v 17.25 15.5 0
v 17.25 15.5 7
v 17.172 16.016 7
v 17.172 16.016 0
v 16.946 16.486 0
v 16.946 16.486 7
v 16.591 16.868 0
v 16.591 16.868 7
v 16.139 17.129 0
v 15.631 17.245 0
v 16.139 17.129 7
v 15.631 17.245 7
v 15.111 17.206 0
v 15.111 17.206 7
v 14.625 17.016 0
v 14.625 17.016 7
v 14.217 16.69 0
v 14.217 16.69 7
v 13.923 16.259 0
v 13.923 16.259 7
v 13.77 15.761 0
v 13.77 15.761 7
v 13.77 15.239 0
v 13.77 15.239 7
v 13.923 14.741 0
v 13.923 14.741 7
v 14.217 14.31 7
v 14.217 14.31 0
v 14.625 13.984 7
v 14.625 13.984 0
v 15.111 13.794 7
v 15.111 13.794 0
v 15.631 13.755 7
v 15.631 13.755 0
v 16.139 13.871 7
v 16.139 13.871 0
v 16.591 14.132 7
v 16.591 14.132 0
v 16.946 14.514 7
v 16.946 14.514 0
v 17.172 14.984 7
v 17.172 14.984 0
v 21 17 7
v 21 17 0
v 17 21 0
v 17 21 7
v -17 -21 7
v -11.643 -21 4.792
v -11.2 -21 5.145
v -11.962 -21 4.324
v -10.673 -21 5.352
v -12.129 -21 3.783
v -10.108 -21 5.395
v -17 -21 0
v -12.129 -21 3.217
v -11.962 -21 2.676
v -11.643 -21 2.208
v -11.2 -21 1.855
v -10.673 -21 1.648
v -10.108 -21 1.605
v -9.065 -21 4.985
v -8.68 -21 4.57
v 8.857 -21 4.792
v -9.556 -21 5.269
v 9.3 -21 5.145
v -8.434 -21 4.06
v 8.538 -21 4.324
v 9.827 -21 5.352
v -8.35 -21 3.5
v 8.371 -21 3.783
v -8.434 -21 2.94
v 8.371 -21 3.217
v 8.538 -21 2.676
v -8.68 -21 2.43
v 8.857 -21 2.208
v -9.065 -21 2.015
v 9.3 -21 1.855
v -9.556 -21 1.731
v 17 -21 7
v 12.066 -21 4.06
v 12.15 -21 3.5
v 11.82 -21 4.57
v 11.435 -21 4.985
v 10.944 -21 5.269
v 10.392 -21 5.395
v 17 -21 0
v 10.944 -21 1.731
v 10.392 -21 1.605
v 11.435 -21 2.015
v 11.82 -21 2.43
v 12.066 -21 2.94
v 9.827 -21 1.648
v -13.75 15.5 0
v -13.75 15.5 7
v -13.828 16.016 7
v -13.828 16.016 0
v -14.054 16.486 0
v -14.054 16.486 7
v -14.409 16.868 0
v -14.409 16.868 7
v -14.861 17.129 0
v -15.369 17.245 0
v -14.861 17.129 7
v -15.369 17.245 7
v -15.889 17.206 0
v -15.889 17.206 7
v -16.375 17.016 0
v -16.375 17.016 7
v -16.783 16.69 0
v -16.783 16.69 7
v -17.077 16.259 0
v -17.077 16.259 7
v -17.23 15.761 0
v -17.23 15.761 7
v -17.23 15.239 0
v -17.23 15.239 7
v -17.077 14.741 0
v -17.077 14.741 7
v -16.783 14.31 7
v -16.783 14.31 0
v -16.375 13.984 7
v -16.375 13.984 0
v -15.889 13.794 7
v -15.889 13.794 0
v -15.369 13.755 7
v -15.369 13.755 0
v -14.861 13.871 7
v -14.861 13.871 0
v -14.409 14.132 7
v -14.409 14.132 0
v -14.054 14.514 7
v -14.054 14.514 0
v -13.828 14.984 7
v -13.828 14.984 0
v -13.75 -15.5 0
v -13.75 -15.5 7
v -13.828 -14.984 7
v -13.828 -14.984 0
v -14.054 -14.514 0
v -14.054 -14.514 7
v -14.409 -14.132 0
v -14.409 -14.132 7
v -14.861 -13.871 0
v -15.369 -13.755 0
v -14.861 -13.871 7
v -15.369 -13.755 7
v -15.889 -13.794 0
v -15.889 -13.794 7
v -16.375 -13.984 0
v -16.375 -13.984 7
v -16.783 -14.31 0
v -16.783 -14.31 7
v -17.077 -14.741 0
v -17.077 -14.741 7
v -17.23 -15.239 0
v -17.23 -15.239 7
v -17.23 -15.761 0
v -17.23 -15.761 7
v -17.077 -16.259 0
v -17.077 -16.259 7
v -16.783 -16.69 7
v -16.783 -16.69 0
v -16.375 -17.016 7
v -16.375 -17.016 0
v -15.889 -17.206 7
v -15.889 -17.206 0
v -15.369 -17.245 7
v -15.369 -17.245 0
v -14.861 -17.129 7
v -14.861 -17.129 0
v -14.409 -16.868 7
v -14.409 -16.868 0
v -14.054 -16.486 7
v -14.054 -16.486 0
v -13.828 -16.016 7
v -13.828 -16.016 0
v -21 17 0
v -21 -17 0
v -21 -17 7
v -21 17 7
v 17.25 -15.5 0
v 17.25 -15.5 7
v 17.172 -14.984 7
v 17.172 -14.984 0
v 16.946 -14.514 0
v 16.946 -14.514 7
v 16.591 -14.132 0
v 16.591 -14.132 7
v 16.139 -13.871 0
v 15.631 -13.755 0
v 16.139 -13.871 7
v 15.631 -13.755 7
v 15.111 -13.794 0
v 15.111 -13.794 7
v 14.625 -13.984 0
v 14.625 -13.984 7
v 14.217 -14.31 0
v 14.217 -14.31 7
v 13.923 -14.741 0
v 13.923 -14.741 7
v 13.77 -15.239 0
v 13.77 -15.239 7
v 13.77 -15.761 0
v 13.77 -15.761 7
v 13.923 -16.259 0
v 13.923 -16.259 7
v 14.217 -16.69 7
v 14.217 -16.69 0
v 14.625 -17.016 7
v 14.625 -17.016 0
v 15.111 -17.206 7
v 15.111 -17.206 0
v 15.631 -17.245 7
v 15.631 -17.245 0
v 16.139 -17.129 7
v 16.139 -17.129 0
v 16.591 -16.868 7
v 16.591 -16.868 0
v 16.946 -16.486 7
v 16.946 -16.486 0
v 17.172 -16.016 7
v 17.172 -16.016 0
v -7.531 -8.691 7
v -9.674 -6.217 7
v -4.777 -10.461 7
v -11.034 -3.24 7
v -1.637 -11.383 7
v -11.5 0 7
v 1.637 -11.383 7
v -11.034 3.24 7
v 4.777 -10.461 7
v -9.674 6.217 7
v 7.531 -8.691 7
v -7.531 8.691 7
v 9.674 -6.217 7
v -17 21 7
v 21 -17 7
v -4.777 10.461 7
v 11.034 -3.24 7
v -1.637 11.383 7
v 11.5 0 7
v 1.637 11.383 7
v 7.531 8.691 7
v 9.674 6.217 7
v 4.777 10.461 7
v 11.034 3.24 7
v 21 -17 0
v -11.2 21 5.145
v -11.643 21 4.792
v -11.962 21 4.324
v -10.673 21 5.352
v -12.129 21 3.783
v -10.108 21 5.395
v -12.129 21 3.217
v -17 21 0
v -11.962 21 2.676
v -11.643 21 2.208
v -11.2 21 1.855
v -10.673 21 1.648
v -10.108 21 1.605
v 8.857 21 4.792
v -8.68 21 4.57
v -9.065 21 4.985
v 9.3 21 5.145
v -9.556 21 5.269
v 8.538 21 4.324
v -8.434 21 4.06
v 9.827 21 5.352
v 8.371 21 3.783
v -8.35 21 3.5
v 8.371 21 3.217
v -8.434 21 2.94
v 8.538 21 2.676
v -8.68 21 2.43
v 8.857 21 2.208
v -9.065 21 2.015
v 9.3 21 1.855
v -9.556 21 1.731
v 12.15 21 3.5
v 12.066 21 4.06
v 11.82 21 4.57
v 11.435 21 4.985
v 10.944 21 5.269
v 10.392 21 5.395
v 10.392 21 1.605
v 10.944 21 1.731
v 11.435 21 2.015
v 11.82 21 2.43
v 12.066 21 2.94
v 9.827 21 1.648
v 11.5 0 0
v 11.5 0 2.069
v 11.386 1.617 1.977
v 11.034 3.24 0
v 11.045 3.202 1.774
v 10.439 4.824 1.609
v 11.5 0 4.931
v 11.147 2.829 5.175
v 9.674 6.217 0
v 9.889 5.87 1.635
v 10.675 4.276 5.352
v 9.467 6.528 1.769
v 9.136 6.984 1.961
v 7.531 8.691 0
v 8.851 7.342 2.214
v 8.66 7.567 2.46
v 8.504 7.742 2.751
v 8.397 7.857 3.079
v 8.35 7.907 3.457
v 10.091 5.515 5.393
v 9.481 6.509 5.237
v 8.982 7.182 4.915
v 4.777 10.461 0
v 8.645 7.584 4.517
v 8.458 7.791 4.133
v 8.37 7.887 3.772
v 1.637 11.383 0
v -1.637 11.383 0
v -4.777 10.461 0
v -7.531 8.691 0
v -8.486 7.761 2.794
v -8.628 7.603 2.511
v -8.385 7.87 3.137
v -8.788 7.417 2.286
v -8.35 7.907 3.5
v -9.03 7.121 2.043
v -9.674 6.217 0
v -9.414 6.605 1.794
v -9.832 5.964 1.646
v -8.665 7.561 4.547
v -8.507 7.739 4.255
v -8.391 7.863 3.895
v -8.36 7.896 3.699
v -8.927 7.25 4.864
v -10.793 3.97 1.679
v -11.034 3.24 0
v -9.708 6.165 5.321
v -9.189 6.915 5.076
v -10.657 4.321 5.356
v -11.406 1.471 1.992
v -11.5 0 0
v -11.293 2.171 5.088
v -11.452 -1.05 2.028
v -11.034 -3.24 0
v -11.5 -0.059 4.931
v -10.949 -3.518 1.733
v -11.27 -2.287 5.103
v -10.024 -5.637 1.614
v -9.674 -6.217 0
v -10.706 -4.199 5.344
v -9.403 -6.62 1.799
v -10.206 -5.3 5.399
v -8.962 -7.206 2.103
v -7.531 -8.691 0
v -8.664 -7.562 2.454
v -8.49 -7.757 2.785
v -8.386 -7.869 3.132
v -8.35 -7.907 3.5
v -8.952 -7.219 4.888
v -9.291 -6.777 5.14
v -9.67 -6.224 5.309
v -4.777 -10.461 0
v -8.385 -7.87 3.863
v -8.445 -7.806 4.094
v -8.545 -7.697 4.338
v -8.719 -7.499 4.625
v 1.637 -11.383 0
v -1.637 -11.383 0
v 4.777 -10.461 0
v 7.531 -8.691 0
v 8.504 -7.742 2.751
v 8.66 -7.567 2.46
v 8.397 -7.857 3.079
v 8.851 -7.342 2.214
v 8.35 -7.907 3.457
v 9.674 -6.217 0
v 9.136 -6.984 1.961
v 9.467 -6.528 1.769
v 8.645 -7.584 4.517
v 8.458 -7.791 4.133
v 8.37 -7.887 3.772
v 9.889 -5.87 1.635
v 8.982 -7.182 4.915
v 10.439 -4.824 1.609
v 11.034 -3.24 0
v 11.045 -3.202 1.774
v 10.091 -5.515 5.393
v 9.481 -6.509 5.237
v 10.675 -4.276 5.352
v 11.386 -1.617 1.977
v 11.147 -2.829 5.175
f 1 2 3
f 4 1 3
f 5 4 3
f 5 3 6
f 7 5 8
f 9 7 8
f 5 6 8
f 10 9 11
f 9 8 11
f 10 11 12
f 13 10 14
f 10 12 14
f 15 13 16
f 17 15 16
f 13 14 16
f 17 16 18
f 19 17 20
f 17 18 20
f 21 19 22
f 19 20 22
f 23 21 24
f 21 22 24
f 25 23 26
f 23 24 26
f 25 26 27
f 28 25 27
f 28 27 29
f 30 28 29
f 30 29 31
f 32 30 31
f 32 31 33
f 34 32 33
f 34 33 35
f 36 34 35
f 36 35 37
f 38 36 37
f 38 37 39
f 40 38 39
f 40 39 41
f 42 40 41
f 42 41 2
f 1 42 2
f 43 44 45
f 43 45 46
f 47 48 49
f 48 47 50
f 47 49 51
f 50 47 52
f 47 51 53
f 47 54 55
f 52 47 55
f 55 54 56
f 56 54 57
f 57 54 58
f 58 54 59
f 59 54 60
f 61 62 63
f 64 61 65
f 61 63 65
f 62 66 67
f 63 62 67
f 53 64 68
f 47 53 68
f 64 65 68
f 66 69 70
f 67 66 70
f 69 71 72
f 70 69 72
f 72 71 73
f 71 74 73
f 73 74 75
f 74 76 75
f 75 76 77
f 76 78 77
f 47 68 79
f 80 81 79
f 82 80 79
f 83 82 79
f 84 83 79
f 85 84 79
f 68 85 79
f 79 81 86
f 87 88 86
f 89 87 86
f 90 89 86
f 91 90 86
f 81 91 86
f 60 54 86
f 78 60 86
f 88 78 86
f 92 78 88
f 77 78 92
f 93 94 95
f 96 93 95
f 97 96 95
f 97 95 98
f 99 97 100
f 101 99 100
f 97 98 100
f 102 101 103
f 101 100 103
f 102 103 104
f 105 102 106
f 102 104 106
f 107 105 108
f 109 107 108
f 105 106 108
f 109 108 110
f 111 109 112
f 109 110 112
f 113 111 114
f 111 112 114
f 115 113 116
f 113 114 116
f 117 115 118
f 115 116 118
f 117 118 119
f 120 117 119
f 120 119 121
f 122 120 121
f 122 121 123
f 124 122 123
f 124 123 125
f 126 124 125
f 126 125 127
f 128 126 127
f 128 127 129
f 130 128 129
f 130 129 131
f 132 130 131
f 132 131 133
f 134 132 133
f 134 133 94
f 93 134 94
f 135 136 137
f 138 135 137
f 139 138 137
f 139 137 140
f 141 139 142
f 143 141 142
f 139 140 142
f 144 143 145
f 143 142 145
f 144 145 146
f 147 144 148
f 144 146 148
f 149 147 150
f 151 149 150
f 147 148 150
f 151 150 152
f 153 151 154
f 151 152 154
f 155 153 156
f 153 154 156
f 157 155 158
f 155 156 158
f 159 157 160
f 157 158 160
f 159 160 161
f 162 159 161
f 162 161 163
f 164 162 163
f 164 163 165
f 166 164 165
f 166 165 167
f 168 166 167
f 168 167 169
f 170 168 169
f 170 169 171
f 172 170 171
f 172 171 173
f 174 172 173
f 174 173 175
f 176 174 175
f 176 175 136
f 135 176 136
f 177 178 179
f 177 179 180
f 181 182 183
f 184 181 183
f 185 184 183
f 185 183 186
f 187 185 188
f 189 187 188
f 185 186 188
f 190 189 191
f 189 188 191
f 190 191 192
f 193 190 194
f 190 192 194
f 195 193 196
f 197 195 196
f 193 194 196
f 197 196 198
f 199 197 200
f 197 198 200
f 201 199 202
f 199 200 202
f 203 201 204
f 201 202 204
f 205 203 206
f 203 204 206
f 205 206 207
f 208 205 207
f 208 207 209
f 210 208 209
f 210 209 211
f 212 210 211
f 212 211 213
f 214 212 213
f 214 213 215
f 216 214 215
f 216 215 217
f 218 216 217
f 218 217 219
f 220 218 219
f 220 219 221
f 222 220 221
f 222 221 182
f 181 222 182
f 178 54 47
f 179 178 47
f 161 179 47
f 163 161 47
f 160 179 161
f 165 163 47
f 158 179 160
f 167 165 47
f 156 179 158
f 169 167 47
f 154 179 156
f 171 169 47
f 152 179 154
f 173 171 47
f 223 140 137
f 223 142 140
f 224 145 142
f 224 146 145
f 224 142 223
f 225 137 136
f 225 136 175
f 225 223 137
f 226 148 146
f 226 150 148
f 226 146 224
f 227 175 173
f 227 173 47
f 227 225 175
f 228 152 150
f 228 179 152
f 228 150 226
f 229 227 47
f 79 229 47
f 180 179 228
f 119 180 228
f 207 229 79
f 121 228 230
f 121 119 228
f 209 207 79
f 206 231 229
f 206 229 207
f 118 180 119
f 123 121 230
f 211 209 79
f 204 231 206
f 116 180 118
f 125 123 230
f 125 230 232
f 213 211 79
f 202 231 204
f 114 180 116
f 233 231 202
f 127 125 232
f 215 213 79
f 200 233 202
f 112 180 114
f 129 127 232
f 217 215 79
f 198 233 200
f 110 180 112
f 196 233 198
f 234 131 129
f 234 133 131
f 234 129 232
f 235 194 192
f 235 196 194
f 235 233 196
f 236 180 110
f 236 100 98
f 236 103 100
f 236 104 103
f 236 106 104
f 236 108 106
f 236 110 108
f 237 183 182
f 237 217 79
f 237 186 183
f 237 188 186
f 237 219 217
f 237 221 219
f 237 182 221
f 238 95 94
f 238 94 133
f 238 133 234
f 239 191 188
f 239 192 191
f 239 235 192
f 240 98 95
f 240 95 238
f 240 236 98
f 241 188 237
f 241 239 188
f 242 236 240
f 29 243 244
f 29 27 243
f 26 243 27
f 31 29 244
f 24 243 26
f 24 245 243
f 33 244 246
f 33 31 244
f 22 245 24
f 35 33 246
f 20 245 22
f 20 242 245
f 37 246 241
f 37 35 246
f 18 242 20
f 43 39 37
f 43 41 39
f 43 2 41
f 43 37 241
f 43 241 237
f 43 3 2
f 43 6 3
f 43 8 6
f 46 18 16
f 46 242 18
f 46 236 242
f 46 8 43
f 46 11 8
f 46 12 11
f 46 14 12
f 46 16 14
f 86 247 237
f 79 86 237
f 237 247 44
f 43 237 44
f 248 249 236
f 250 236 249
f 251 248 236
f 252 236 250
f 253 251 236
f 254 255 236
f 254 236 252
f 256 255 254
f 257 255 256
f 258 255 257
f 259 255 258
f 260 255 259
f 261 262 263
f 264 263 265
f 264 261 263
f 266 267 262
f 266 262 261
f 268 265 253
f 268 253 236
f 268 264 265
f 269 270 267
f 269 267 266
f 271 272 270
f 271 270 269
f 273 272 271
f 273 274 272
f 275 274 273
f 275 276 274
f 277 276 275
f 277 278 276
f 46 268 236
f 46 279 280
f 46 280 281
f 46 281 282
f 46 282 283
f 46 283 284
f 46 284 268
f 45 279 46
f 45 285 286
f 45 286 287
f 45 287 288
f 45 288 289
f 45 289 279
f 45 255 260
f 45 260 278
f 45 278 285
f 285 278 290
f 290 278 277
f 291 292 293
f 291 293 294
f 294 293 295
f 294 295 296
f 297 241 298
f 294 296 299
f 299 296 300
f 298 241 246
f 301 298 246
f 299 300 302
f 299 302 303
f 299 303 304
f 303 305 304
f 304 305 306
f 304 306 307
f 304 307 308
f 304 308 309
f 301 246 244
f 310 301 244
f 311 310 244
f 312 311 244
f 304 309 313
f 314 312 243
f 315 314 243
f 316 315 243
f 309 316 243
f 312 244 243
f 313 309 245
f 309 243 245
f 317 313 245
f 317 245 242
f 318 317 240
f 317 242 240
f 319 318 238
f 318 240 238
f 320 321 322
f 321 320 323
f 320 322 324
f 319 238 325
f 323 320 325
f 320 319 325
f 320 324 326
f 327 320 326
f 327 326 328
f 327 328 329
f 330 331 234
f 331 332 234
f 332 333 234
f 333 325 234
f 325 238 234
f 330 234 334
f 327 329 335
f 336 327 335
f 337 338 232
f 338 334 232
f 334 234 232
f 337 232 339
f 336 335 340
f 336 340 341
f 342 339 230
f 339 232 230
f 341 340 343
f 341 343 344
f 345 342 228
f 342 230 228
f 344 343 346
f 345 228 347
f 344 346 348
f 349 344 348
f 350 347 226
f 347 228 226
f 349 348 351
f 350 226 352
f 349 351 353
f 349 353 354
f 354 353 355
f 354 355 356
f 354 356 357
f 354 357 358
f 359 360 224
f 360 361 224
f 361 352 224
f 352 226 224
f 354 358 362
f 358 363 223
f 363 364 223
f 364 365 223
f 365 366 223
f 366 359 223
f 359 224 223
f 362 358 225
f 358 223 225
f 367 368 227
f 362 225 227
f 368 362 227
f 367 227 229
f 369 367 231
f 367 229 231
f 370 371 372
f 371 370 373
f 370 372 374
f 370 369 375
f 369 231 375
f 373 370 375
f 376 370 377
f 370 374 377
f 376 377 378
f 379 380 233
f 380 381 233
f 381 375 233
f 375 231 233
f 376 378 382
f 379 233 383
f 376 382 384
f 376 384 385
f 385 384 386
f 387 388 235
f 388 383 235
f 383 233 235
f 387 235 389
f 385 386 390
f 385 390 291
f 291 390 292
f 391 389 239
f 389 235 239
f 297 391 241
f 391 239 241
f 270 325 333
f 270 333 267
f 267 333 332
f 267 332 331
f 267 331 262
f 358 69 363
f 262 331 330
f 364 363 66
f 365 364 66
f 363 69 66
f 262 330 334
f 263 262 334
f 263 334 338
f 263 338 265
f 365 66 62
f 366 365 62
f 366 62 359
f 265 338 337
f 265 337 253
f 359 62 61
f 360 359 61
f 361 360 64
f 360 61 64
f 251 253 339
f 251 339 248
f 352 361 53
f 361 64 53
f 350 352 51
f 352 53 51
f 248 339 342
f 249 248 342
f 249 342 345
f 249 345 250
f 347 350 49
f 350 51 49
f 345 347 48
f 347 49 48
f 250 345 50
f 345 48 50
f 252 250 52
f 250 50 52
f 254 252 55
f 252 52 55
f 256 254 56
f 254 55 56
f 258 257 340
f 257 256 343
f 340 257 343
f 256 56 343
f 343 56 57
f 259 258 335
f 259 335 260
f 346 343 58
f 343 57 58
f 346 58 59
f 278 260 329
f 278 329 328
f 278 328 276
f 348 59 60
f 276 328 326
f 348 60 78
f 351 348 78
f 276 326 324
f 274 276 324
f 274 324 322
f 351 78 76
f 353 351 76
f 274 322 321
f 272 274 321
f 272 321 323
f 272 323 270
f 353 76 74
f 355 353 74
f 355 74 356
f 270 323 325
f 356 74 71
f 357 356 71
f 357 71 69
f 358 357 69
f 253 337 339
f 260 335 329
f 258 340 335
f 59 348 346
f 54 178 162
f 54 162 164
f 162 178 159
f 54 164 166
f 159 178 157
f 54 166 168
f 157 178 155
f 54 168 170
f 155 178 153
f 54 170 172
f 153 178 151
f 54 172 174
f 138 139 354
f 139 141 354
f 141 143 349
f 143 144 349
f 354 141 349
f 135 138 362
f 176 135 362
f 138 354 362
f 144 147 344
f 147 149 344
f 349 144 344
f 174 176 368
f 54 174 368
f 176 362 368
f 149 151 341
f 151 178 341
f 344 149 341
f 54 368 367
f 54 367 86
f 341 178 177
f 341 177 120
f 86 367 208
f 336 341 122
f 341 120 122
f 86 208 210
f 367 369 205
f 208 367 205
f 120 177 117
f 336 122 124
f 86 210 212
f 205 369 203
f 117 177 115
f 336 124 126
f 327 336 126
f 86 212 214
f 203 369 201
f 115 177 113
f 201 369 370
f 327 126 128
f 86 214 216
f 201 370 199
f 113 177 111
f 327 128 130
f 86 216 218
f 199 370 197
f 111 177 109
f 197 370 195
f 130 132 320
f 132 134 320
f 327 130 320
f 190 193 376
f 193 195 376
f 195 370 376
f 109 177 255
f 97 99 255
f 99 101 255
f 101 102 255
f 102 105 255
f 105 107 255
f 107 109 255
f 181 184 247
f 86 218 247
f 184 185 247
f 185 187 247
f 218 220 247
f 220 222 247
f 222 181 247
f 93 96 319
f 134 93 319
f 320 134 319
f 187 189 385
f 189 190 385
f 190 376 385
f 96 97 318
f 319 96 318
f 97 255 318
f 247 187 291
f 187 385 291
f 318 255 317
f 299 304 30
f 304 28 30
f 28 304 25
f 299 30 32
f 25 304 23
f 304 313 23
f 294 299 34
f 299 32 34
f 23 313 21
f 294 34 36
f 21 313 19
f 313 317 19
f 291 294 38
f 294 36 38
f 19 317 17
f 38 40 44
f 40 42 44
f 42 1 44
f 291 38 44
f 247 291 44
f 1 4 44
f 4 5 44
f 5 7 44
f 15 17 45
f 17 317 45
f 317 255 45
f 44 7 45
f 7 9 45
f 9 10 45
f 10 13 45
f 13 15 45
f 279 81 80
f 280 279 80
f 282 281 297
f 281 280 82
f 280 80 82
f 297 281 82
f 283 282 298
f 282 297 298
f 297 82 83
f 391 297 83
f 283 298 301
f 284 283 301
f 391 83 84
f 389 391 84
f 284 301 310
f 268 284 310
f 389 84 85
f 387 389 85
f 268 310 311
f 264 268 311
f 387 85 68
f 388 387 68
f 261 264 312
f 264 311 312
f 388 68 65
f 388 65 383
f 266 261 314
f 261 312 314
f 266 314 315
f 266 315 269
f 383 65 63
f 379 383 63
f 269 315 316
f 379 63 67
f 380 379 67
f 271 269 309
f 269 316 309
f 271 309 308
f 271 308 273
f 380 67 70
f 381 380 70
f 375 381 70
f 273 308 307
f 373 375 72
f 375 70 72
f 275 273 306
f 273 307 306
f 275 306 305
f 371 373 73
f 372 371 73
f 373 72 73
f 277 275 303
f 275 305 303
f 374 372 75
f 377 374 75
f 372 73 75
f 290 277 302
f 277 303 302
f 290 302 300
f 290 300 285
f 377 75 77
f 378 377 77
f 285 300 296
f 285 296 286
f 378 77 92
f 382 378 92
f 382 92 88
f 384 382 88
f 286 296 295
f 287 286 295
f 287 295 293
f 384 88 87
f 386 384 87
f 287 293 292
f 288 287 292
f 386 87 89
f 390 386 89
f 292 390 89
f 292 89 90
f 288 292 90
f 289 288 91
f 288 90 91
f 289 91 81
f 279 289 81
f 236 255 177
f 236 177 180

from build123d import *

# Parameters (mm, degrees)
SKETCH_W        = 42
SKETCH_H        = 42
PAD_DEPTH       = 7
SKETCH001_R     = 11.5
POCKET_DEPTH    = 12
SKETCH002_R     = 1.75
POCKET001_DEPTH = 12
SKETCH003_R     = 1.9
POCKET002_DEPTH = 42
CHAMFER_SIZE    = 4


with BuildPart() as part:
    # Sketch → Pad (new body)
    with BuildSketch(Plane.XY):
        Rectangle(SKETCH_W, SKETCH_H)
    extrude(amount=PAD_DEPTH)

    # Sketch001 (on Face6 of Pad) → Pocket (cut)
    with BuildSketch(Plane.XY.offset(7)):
        Circle(SKETCH001_R)
    extrude(amount=-POCKET_DEPTH, mode=Mode.SUBTRACT)

    # Sketch002 (on Face5 of Pocket) → Pocket001 (cut)
    with BuildSketch(Plane.XY.offset(7)):
        with Locations((15.5, 15.5)):
            Circle(SKETCH002_R)
        with Locations((-15.5, 15.5)):
            Circle(SKETCH002_R)
        with Locations((-15.5, -15.5)):
            Circle(SKETCH002_R)
        with Locations((15.5, -15.5)):
            Circle(SKETCH002_R)
    extrude(amount=-POCKET001_DEPTH, mode=Mode.SUBTRACT)

    # Sketch003 (on Face1 of Pocket001) → Pocket002 (cut)
    with BuildSketch(Plane.XZ.offset(21)):
        with Locations((-10.25, 3.5)):
            Circle(SKETCH003_R)
        with Locations((10.25, 3.5)):
            Circle(SKETCH003_R)
    extrude(amount=-POCKET002_DEPTH, mode=Mode.SUBTRACT)

    # Chamfer
    chamfer_edges = [part.edges().sort_by_distance(p)[0] for p in [
        (-21, -21, 3.5),
        (21, -21, 3.5),
        (21, 21, 3.5),
        (-21, 21, 3.5),
    ]]
    chamfer(chamfer_edges, length=CHAMFER_SIZE)


solid = part.part
